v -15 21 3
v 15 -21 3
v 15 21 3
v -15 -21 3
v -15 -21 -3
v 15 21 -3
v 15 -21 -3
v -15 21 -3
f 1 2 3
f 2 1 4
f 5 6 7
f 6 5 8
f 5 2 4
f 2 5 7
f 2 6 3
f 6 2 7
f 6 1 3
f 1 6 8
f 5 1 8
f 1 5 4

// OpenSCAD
// file: dimensions.scad
//
// Shared component and stack dimensions
// Units: mm
// Legend:
// - L: Length
// - W: Width
// - T: Thickness
//
// Case frame: X runs along the load-cell axis, -Y points to the front wall
// with the USB-C connector and the switch, and Z = 0 is the floor's outer
// face.
//

// Load cell
lc_L = 80;
lc_W = 40;
lc_T = 4;

eye_d = 17;
eye_edge_start = 6;
eye_center_offset = eye_edge_start + eye_d / 2;
eye_ring_bore_d = 13.9; // pressed-in eye ring, measured 13.8-13.9 mm; not modelled in load_cell.scad
carabiner_shank_d = 12;
// Radial clearance from each eye hole to its slot wall. The battery sides sit
// inboard of the eyes, so the battery bay cuts each slot short on its inboard
// side.
eye_slot_clear = 2.5;

// Silicone-covered strain gauge at the load-cell center. The plate goes in
// with the cover facing the floor and its four wires leaving the cover's
// front (-Y) side, so the battery lies flat on the bare top face. Footprint
// from the assembly photos; the height is measured (6.5 mm across the plate
// and cover).
gauge_cover_w = 14; // along X
gauge_cover_l = 21; // along Y
gauge_cover_h = 2.5;
gauge_cover_y = 4.3; // center offset toward the wire exit
loadcell_wire_bundle = [2.0, 1.4]; // four ~0.7 mm wires two by two: width, height
// Floor pads hold the plate this far above the cover's underside, with room
// for its wires beside it.
loadcell_cover_clear = 0.5;
loadcell_pad_size = 5;

notch_d = 6;
notch_xA = 20;
notch_xB = 60;
// The rear screw posts stand in the rear notches.
notch_post_clear = 0.1; // radial

// Shell shared by the main body and lid.
wall_t = 2.4;
floor_t = 2.4;
lid_t = 2.4;
// The lid may seat anywhere within the 0.25 mm play of the screws in their
// lid holes, plus 0.2 mm for printed walls off size.
lid_seat_play = 0.45;
// Rounds the outer vertical edges.
case_corner_r = 1;

// The walls enclose the whole load cell, including all four corners.
loadcell_guard_clear = 0.5;
// Lid features over the load cell stop this far above it, so a printed part
// slightly off size cannot hold the lid open.
loadcell_hold_down_clear = 0.6;
loadcell_slot_wall_t = 1.2;
loadcell_slot_clear_z = 0.3;
// Gap from the lid slot-wall ends to the main body. The screws locate the
// lid; at 0.2 mm the tall wall ends wedged into the slightly undersized
// printed cavity and held the lid open.
slot_wall_fit = 0.6;
// Each lid slot-wall end reaches this far into a groove in the end wall, so
// the gap round it is a labyrinth instead of a slit from the slot into the
// bay.
slot_seal_overlap = 1.5;

// Battery: 603040 LiPo cell with its protection board, 6 x 30 x 42 mm overall
// (https://es.aliexpress.com/item/1005010306922880.html). It lies flat on
// the load cell with its protection-board end toward the front wall. Its
// leads leave one corner of that end sideways; turn the cell over so they
// leave the right (+X) corner, then bend them forward beside it.
bat_L = 42;
bat_W = 30;
bat_T = 6;
battery_side_clear = 0.5; // to the bay walls beside the eye slots
battery_stop_clear = 0.3; // to the front column and the rear wall
battery_lead_y = 1.5; // lead exit behind the front end, mid protection board
battery_lead_bend = 2.5; // room beside the right corner for both leads to turn
// Lid hold-downs beside the board stop this far above the battery. They limit
// how far it can lift without pressing it onto the load cell, whose reading
// would shift under the load.
battery_hold_down_clear = 0.3;

// PCB: crimpdeq-tscircuit (ADS1220 variant), 17 x 31.5 mm, from its
// circuit.json. The board sits top side up and unrotated: the ESP32 module,
// USB-C connector and both LEDs face the lid, and a tscircuit offset (x, y)
// from the board center is case-local (x, y). Rectangles below are
// [x_min, x_max, y_min, y_max] in that frame.
pcb_W = 17;
pcb_L = 31.5;
pcb_board_t = 1.6;
pcb_corner_r = 1;
pcb_bottom_parts_h = 1.45; // tallest bottom part: 0805 10 uF (C15, C17) at its maximum
pcb_top_parts_h = 1.0; // SOD-323 D8 and the other low top parts
pcb_module_rect = [-6.6, 6.6, -1.2, 15.4]; // ESP32-C3-MINI-1, antenna at the +Y edge
pcb_module_h = 2.5;
// Bare bottom-side strips from the front edge between each wire-pad column
// and the USB-C shell legs, 0.2 mm from the wire pads and clear of the
// courtyards. Case supports touch the board only there.
pcb_support_windows = [
    [-6.05, -4.93, -pcb_L / 2, -7.4],
    [4.93, 6.05, -pcb_L / 2, -7.3]
];
// Plated wire pads: J3 E+, S+, S-, E- on the left and J4 SW-, SW+, B+, B- on
// the right.
pcb_cable_pads = [
    [-7, -7.25], [-7, -9.45], [-7, -11.65], [-7, -13.85],
    [7, -7.8], [7, -10], [7, -12.2], [7, -14.4]
];
wire_d = 1.6; // 24 AWG silicone hookup wire
// Room between the battery front and the wires dropping from the nearest pads.
cable_pad_battery_clear = 0.8;

// USB-C receptacle (TYPE-C-31-M-12, top side) from its 3D model. Its front
// face overhangs the board edge by 1.0 mm; its flat shell top takes the lid
// clamp.
usb_rect = [-4.47, 4.47, -16.75, -9.0];
usb_shell_top_rect = [-4.1, 4.1, -16.6, -9.4];
usb_h = 3.25;

// USB-C cable plug. The metal shell enters the receptacle; the overmold is the
// largest envelope in the USB Type-C plug dimensions update ECN
// (12.85 x 7.0 mm, up from 12.35 x 6.5 mm).
usb_plug_shell_w = 8.6;
usb_plug_shell_h = 3.0;
usb_plug_shell_corner_r = 0.7;
usb_overmold_w = 12.85;
usb_overmold_h = 7.0;
usb_overmold_corner_r = 1.0;
// The fully mated overmold may stop this far in front of the receptacle
// face. Keep it small: plugs have well under a millimeter of spare length.
usb_overmold_stop_gap = 0.3;
// The connector reaches into a front-wall opening; a pocket in front of it
// lets the cable overmold reach the receptacle face.
usb_hole_clear = 0.55; // around the connector body
usb_pocket_clear = 0.4; // around the cable overmold
usb_pocket_min_web = 0.8; // front wall left behind the pocket
usb_lid_clear = 0.4; // receptacle top to the lid underside

// Top-side LEDs. D1 is the battery-status LED, a 0603 turned 90 degrees; D4
// is the XL-2121RGBC RGB LED.
status_led_x = 4.1;
status_led_y = -3.403;
status_led_w = 0.8;
status_led_l = 1.6;
status_led_h = 0.8;
rgb_led_x = -6.4;
rgb_led_y = -3.279;
rgb_led_w = 2.2;
rgb_led_l = 2.2;
rgb_led_h = 1.0;

// Stack spacing
battery_to_pcb_gap = 0.5; // battery top to the board's bottom parts
pcb_front_gap = 0.2; // board front edge to the inner front wall
pcb_guide_clear = 0.25; // board long edges to the front screw posts
top_clear = 0.5; // minimum ESP32 module-to-lid gap

// Front-wall switch (KCD11 10x15 mm). Measured 15.2 mm from its front to the
// end of its heat-shrunk solder joints; all of it is taken as behind the
// outer wall face, the worst case.
switch_w = 15; // along X
switch_h = 10; // along Z
switch_depth = 15.2;
switch_clear = 0.4;
switch_flange = 1.0; // bezel lip beyond the opening on the outer face
// The bezel is held only by friction in its wall opening. v2.0.0's 3.0 mm
// wall held it; a collar behind the front wall restores that length.
switch_grip_len = 3.0;
switch_collar_t = 1.2;
// Room behind the solder joints for the wires to turn up over the battery.
switch_wire_bend = 3.5;
switch_loadcell_clear = 0.5; // switch underside above the load cell

// M2.5x10 fasteners shared by main and lid. Each center sits at least this
// far inside the outer faces, as in v2.0.0. Screwing into a pilot 3.4 mm from
// a face split the wall along a layer line.
screw_edge_inset = 5.25;
screw_len = 10; // under the head
screw_head_d = 5.2; // typical M2.5 button/pan head clearance
screw_head_recess = 1.8; // recess depth so heads do not protrude
screw_post_d = 6.5;
screw_thread_d = 2.15; // pilot for M2.5 thread-forming screws in plastic
screw_thread_tip_clear = 0.6; // pilot depth beyond the screw tip
// 45 degree countersink at each pilot entrance. Plastic the screw displaces
// collects in it instead of curling up above the post and holding the lid off.
screw_pilot_chamfer = 0.6;
// main file
//
// Battery model (envelope of the cell and its protection board)
// Units: mm
//

include <dimensions.scad>

module battery_model() {
    color("gray")
        cube([bat_W, bat_L, bat_T], center = true);
}

battery_model();
